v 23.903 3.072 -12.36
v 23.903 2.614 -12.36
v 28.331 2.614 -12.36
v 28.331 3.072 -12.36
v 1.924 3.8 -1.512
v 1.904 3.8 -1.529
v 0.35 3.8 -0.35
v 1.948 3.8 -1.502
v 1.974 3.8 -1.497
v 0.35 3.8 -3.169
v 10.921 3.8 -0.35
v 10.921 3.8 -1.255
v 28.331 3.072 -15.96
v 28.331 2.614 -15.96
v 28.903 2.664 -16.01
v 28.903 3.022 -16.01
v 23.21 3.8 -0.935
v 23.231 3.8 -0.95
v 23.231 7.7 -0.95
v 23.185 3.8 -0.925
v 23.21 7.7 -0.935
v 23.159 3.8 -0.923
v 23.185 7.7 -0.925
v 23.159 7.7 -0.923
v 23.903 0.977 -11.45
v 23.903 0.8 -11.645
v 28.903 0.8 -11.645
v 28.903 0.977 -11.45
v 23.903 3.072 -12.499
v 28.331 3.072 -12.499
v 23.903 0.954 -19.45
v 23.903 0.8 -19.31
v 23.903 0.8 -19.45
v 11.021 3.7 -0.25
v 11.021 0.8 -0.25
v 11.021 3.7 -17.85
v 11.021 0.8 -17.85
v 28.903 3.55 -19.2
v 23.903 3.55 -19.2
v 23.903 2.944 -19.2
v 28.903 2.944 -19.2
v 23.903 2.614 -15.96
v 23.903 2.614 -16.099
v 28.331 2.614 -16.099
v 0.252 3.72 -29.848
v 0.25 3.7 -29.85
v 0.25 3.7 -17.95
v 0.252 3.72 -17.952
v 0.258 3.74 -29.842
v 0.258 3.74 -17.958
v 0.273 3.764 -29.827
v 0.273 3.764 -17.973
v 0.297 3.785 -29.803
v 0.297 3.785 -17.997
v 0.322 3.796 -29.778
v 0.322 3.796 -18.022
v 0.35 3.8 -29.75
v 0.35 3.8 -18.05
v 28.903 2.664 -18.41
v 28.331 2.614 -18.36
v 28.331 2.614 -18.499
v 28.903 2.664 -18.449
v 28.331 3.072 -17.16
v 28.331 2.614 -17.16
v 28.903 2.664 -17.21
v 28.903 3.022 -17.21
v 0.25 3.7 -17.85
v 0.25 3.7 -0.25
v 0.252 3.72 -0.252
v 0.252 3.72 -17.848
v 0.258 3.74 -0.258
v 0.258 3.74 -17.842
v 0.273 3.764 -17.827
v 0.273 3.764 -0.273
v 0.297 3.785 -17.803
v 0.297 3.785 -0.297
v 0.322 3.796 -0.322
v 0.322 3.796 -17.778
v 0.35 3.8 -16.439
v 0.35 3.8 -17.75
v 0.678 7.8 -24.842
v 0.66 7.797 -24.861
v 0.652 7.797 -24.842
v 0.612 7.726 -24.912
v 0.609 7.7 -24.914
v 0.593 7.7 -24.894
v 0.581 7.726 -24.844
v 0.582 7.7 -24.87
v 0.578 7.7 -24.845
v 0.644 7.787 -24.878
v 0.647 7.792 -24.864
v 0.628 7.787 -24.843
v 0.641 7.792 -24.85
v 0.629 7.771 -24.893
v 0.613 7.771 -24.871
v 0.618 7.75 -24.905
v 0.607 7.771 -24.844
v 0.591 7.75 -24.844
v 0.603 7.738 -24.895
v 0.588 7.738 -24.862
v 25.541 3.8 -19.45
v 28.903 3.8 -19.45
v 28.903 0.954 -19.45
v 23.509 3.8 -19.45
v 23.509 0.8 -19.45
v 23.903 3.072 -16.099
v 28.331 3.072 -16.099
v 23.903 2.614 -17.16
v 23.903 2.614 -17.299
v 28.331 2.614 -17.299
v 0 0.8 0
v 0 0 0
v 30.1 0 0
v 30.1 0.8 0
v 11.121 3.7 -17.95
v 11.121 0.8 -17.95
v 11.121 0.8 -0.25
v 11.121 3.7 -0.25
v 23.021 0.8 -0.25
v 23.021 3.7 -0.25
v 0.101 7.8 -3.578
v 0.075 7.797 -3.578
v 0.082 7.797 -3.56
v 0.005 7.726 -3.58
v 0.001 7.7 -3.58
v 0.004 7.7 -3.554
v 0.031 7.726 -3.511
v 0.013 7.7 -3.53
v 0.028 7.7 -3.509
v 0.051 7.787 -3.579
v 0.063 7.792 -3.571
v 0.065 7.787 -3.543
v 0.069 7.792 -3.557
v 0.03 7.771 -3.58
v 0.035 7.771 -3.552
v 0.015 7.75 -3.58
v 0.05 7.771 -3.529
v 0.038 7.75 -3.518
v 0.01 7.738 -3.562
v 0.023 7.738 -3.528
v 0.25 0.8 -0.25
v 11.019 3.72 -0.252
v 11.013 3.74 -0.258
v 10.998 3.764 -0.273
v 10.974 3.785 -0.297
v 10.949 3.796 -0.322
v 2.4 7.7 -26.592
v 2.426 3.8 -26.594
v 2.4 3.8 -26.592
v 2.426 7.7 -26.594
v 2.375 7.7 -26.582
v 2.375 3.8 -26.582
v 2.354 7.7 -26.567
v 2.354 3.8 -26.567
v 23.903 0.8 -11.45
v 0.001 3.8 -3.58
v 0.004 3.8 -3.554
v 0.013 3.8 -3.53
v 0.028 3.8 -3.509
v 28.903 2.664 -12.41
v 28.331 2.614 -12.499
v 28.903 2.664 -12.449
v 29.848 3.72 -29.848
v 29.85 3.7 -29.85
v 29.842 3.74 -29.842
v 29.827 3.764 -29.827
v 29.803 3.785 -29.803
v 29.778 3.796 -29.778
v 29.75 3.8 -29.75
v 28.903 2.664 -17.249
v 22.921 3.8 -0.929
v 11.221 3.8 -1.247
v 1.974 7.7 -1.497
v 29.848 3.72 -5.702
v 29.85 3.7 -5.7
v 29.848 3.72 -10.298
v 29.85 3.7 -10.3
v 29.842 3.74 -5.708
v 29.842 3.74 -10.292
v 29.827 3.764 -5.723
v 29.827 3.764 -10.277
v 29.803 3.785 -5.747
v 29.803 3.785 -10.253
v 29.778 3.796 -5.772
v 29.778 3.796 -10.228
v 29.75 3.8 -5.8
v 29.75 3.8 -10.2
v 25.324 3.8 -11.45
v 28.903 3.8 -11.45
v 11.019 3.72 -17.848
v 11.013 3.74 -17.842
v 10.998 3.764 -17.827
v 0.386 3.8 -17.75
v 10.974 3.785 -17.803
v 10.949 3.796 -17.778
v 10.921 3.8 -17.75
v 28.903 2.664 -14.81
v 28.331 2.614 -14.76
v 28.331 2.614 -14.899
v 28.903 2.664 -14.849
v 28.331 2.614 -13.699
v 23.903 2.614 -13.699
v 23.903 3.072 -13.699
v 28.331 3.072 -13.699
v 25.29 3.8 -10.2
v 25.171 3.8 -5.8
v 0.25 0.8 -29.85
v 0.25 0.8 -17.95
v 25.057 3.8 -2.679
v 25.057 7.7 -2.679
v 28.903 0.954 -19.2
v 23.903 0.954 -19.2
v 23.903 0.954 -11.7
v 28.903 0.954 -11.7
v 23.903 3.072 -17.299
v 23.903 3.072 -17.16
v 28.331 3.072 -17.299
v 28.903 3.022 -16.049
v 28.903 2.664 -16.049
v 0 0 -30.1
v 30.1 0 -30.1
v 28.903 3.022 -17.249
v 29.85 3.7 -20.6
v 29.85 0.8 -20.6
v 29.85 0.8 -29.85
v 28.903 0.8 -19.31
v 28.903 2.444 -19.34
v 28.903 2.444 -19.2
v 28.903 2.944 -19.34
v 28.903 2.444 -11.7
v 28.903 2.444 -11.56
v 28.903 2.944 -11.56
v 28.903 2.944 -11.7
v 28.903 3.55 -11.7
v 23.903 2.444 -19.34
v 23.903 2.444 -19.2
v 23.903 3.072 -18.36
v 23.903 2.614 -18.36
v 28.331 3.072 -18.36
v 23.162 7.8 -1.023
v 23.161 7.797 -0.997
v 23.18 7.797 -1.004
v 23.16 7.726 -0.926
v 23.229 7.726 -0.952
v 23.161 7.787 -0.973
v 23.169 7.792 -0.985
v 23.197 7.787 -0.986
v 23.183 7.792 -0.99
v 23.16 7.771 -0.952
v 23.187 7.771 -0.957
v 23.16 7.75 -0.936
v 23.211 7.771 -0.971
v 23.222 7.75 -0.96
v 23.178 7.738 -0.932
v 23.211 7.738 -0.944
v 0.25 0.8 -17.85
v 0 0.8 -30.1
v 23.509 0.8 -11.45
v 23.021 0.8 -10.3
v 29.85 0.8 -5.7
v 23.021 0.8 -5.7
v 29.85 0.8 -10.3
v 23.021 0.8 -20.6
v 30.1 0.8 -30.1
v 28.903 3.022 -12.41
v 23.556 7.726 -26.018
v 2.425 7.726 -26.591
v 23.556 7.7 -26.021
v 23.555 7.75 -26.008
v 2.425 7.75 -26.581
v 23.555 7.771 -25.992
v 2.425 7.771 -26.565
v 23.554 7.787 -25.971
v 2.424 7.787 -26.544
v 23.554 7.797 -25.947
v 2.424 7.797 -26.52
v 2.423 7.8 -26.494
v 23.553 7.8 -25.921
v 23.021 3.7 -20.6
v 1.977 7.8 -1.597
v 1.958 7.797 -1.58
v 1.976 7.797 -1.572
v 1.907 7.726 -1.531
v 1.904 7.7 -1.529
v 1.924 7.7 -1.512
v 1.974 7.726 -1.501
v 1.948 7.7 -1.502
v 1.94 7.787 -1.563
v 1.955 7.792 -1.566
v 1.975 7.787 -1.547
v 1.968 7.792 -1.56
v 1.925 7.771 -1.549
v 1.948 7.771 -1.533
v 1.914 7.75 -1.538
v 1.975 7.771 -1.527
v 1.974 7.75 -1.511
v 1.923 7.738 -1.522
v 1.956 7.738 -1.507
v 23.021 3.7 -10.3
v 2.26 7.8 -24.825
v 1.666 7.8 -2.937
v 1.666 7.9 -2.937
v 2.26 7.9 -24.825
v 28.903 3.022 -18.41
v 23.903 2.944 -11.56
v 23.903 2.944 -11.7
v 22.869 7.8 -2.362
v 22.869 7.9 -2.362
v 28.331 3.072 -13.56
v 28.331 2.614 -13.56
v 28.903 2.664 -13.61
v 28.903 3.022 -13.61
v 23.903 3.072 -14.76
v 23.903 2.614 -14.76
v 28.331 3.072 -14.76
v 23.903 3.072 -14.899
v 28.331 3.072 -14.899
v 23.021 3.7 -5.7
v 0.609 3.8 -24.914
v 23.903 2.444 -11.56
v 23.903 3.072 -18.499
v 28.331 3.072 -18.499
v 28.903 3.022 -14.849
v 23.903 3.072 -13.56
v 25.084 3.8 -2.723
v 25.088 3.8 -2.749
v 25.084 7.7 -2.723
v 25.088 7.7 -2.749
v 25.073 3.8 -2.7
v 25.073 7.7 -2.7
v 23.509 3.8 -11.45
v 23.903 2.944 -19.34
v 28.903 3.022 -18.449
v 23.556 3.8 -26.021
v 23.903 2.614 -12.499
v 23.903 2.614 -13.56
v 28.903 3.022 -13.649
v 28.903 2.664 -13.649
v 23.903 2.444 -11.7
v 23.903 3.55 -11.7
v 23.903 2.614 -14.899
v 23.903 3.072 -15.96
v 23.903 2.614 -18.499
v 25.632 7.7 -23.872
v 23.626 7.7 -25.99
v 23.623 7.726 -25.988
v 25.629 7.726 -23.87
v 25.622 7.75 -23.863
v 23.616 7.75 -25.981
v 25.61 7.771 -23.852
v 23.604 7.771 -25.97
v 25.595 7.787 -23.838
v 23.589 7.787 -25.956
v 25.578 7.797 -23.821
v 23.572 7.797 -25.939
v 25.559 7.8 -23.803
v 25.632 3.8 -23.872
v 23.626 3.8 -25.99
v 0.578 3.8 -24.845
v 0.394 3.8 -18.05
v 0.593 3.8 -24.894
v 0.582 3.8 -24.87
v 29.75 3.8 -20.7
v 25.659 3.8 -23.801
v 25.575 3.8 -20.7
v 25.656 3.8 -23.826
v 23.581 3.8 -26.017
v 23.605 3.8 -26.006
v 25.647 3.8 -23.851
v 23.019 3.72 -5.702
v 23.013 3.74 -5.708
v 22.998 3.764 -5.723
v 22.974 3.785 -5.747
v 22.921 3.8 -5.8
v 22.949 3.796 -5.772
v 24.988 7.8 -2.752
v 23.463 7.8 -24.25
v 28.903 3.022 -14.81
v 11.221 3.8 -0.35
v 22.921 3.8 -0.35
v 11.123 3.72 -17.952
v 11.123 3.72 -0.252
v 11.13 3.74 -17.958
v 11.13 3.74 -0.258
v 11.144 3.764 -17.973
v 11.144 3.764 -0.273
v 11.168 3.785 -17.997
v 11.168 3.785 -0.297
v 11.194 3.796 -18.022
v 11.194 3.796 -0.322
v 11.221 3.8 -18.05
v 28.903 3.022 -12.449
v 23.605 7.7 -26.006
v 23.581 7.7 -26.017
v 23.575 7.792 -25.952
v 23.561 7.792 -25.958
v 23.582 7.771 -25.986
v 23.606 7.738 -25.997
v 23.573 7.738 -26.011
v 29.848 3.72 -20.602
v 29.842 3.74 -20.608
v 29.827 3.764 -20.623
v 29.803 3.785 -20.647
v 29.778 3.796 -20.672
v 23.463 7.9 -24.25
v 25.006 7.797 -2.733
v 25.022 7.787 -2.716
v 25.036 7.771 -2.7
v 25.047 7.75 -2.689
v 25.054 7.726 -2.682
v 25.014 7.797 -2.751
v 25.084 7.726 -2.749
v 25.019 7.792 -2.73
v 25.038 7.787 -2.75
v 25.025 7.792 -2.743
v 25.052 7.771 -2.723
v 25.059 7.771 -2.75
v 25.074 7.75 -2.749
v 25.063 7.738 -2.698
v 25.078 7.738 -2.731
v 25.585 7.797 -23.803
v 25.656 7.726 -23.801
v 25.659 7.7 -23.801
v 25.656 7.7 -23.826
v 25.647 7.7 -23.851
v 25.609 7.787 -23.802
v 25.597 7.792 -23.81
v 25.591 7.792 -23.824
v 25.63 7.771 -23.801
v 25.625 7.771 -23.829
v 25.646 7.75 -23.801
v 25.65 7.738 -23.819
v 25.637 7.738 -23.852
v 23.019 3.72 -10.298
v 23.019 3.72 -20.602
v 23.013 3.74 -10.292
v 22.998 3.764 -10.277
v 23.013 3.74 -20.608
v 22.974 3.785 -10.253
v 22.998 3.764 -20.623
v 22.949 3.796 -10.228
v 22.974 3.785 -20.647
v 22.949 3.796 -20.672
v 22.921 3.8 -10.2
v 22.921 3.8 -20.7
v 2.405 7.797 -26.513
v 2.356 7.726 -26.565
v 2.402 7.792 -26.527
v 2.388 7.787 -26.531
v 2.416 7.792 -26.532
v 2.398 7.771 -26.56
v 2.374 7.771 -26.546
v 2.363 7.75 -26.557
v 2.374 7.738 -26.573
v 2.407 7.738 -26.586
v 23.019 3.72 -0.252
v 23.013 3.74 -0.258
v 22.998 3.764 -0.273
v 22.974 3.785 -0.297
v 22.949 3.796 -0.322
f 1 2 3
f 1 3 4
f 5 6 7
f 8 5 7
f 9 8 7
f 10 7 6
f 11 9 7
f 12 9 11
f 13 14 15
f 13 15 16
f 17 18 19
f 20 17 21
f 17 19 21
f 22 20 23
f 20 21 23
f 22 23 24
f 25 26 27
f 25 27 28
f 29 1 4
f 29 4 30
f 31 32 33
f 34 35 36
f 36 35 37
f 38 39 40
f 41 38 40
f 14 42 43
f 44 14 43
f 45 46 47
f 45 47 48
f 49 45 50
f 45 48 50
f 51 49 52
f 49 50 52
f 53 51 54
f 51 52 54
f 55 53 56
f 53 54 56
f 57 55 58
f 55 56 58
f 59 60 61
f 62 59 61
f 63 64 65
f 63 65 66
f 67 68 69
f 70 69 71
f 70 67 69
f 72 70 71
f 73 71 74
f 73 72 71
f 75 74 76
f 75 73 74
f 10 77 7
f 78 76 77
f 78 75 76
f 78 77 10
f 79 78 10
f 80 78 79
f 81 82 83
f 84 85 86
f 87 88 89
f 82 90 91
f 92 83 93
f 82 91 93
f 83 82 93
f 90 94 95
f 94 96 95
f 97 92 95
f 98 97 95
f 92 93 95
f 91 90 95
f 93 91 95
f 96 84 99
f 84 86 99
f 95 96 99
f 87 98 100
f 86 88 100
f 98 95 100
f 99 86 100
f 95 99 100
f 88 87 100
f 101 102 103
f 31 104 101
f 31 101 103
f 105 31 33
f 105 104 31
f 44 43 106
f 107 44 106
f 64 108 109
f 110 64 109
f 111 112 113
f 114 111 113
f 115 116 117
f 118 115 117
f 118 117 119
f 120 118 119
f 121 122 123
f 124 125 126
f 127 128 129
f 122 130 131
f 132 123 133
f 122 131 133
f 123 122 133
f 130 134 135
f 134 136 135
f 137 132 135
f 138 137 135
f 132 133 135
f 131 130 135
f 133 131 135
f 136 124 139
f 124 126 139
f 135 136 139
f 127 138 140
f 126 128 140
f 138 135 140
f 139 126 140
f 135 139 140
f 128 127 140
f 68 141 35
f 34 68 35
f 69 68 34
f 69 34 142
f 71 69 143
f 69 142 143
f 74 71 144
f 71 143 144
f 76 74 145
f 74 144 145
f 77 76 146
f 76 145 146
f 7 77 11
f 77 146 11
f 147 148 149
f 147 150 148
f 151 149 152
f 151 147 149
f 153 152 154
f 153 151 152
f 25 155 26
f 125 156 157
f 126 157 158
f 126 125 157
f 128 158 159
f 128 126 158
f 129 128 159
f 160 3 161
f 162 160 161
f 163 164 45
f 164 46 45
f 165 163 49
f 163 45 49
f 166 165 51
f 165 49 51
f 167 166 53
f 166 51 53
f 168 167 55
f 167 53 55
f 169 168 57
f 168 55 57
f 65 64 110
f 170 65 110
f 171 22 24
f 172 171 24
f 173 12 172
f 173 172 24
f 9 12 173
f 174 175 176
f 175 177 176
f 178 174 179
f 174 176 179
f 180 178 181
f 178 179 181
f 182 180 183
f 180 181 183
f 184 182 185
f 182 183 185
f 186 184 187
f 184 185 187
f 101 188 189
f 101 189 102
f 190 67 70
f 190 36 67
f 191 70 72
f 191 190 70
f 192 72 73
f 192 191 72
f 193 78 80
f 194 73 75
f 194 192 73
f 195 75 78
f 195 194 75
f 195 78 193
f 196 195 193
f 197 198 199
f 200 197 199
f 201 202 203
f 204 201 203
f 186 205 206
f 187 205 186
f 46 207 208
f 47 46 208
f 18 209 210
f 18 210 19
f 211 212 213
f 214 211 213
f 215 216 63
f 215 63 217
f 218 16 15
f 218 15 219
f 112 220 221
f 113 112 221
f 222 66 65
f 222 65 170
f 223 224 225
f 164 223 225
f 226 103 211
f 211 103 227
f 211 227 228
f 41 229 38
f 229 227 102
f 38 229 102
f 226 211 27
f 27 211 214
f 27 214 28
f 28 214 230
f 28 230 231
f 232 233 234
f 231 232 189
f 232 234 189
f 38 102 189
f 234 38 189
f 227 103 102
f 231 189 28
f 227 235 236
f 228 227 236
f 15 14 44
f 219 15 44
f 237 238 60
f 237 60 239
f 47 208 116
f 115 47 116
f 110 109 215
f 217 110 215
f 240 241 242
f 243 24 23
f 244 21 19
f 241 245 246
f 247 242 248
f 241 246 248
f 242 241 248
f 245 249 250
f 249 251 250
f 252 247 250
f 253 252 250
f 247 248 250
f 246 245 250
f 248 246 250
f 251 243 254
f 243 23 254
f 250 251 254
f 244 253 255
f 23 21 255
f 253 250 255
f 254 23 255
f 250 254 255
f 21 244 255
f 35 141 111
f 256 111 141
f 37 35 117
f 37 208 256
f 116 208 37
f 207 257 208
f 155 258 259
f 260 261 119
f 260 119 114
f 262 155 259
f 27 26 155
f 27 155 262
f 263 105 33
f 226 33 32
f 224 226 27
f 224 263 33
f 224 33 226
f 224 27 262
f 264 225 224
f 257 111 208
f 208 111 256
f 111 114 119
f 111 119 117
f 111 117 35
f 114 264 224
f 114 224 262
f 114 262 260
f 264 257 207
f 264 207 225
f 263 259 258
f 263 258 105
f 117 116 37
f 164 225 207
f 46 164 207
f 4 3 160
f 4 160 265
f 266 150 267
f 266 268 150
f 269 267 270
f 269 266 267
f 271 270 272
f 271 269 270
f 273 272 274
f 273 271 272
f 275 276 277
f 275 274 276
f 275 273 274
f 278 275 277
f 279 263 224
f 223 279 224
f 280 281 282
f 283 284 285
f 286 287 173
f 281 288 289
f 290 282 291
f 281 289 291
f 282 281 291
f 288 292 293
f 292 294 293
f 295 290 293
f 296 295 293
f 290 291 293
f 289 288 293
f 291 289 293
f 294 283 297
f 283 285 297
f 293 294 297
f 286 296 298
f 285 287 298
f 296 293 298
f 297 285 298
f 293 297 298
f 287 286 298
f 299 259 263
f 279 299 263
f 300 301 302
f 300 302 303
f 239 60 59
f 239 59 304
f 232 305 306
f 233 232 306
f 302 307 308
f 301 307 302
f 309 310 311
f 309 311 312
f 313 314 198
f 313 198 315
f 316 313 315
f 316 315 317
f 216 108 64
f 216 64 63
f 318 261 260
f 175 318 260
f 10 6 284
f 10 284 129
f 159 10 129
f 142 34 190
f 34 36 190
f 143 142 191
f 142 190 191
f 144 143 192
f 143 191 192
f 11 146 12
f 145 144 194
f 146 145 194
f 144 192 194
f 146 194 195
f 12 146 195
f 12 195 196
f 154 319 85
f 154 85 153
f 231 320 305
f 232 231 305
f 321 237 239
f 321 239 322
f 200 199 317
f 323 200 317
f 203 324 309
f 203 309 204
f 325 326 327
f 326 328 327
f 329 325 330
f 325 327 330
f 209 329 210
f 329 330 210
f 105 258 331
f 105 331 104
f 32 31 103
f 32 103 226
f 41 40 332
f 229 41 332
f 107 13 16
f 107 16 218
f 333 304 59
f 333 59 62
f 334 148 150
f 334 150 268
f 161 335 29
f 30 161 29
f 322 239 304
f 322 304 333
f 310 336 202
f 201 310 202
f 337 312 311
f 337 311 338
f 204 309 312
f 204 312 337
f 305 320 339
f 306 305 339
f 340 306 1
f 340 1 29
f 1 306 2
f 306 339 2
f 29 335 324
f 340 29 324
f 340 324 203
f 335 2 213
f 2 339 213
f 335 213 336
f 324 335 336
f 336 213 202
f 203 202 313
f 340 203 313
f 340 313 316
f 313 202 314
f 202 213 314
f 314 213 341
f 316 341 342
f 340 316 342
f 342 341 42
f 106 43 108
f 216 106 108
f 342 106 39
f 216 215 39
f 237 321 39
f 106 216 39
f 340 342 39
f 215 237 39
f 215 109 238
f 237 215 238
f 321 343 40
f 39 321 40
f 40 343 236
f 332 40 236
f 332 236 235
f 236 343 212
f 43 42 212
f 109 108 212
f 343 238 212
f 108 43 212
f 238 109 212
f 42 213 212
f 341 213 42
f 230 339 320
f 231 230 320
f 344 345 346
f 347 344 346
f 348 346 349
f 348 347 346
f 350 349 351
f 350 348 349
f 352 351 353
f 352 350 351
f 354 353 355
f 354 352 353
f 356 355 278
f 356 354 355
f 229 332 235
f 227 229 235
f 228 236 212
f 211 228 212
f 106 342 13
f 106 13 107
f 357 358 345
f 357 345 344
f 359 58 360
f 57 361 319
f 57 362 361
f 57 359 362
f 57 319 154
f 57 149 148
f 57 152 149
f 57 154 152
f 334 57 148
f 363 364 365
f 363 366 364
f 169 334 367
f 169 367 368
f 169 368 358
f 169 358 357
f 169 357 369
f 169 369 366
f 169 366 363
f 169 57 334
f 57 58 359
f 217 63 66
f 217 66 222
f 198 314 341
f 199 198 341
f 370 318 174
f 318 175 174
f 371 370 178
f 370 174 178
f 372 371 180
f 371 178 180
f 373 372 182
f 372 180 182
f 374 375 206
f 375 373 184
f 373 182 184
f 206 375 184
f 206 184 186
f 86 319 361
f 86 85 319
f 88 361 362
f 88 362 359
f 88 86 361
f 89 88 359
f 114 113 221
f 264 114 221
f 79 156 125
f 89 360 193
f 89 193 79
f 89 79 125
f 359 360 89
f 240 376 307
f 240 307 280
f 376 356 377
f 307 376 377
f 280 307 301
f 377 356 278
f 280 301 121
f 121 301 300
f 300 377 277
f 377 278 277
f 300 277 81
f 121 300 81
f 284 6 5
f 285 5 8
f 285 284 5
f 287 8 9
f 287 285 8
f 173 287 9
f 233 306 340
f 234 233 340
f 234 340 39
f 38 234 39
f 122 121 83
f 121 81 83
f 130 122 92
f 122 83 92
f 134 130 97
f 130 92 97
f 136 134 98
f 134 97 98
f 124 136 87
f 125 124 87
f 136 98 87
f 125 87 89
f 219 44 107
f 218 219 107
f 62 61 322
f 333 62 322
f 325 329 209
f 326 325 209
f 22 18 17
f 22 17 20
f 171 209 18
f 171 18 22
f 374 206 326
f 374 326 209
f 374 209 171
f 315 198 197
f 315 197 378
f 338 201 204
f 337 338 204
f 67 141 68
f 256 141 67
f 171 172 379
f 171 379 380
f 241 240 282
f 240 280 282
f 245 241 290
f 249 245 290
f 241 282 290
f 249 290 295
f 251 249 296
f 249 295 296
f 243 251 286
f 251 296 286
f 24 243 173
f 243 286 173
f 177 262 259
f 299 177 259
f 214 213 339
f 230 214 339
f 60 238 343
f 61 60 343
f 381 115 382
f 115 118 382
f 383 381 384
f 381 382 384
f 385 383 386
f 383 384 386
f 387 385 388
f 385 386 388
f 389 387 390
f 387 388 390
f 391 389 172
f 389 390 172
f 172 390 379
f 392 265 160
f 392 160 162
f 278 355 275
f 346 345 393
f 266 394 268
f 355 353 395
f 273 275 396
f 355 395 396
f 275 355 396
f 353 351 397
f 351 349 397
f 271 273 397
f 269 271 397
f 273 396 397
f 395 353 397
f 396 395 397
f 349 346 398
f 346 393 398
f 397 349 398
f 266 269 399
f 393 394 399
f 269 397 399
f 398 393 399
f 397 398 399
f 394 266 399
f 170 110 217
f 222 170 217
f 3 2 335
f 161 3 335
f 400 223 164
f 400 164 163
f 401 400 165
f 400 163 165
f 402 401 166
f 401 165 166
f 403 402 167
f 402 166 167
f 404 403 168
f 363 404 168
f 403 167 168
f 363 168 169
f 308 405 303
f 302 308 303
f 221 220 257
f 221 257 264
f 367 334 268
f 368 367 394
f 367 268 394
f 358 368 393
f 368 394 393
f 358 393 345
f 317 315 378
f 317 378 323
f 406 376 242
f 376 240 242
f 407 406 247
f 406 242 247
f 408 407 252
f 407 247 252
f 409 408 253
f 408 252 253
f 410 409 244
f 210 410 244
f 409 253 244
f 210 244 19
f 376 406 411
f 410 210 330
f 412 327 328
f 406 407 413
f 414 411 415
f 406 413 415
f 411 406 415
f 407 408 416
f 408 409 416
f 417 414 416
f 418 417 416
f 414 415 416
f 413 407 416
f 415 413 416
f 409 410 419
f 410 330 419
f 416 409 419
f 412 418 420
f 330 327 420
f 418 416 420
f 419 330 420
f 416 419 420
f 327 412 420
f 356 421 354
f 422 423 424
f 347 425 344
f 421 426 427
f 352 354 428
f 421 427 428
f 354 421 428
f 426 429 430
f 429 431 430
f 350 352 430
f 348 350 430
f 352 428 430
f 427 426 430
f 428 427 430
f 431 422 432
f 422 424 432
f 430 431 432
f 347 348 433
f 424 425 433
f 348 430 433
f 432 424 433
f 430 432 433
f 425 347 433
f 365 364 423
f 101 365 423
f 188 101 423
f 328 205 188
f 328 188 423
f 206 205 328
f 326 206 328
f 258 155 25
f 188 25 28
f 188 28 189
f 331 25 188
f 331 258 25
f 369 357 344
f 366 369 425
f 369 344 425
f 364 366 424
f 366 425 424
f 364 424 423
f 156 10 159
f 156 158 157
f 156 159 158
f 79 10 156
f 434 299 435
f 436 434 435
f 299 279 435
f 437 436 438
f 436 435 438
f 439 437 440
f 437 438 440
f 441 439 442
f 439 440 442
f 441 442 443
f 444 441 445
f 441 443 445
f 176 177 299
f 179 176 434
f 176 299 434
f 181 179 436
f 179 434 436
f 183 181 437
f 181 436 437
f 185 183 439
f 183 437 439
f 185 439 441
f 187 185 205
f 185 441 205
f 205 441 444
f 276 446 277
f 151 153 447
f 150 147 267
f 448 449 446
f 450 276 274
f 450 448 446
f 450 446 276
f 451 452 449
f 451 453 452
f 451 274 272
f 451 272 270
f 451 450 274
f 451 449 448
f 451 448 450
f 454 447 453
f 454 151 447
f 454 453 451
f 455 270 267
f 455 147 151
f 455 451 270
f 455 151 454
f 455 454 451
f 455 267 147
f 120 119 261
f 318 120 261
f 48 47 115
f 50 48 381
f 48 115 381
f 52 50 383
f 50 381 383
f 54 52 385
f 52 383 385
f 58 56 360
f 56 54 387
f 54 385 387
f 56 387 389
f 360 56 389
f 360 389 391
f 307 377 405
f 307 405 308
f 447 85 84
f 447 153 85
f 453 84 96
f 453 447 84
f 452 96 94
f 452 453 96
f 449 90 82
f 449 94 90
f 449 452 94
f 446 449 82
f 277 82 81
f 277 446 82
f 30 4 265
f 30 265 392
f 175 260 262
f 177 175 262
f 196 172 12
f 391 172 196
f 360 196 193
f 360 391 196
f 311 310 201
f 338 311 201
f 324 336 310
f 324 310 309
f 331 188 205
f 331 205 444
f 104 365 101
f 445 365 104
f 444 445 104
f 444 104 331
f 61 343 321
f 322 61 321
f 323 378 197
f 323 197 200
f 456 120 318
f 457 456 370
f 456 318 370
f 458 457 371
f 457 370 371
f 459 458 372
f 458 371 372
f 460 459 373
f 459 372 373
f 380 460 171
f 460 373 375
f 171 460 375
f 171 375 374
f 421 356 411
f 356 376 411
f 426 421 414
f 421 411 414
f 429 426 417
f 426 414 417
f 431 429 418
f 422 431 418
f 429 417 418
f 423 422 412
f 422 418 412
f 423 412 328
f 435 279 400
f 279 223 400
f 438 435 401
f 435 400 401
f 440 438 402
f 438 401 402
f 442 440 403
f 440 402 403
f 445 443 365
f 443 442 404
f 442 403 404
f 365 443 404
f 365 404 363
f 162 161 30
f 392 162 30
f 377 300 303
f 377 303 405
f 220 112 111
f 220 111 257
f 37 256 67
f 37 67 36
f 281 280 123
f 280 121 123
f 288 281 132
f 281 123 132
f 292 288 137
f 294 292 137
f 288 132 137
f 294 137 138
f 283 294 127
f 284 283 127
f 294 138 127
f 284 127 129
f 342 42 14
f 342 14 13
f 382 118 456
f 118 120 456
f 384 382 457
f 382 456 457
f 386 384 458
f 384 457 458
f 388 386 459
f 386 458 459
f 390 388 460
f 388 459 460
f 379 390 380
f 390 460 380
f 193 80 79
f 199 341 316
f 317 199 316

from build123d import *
from OCP.BRepFilletAPI import BRepFilletAPI_MakeChamfer

# Parameters (mm, degrees)
SKETCH1_W           = 30.1
SKETCH1_H           = 30.1
BOSS_EXTRUDE1_DEPTH = 0.8
SKETCH2_W           = 10.771359077
SKETCH2_H           = 17.6
BOSS_EXTRUDE2_DEPTH = 3
FILLET1_R           = 0.1
SKETCH3_W           = 0.393223552
SKETCH3_H           = 8
BOSS_EXTRUDE3_DEPTH = 3
BOSS_EXTRUDE4_DEPTH = 5
SKETCH5_W           = 0.139227725
SKETCH5_H           = 0.457931022
BOSS_EXTRUDE5_DEPTH = 5
CHAMFER1_SIZE       = 0.05
CHAMFER1_SIZE2      = 0.571502615
BOSS_EXTRUDE6_DEPTH = 4
BOSS_EXTRUDE7_DEPTH = 0.1
FILLET2_R           = 0.1


with BuildPart() as part:
    # Sketch1 → Boss-Extrude1 (new body)
    with BuildSketch(Plane(origin=(0, 0, 0), x_dir=(1, 0, 0), z_dir=(0, 1, 0))):
        with Locations((15.05, 15.05)):
            Rectangle(SKETCH1_W, SKETCH1_H)
    extrude(amount=BOSS_EXTRUDE1_DEPTH)

    # Sketch2 → Boss-Extrude2 (add)
    with BuildSketch(Plane(origin=(0, 0.8, 0), x_dir=(1, 0, 0), z_dir=(0, 1, 0))):
        Polygon((29.85, 29.85), (0.25, 29.85), (0.25, 17.95), (11.121359077, 17.95), (11.121359077, 0.25), (23.021359077, 0.25), (23.021359077, 5.7), (29.85, 5.7), (29.85, 10.3), (23.021359077, 10.3), (23.021359077, 20.6), (29.85, 20.6), align=None)
        with Locations((5.635679539, 9.05)):
            Rectangle(SKETCH2_W, SKETCH2_H)
    extrude(amount=BOSS_EXTRUDE2_DEPTH)

    # Fillet1
    fillet1_edges = [part.edges().sort_by_distance(p)[0] for p in [
        (29.85, 3.8, -25.225),
        (15.05, 3.8, -29.85),
        (0.25, 3.8, -23.9),
        (5.685679539, 3.8, -17.95),
        (11.121359077, 3.8, -9.1),
        (17.071359077, 3.8, -0.25),
        (23.021359077, 3.8, -2.975),
        (26.435679539, 3.8, -5.7),
        (29.85, 3.8, -8),
        (26.435679539, 3.8, -10.3),
        (23.021359077, 3.8, -15.45),
        (26.435679539, 3.8, -20.6),
        (11.021359077, 3.8, -9.05),
        (5.635679539, 3.8, -17.85),
        (0.25, 3.8, -9.05),
        (5.635679539, 3.8, -0.25),
    ]]
    fillet(fillet1_edges, radius=FILLET1_R)

    # Sketch3 → Boss-Extrude3 (add)
    with BuildSketch(Plane(origin=(0, 0.8, 0), x_dir=(1, 0, 0), z_dir=(0, 1, 0))):
        with Locations((23.705954143, 15.45)):
            Rectangle(SKETCH3_W, SKETCH3_H)
    extrude(amount=BOSS_EXTRUDE3_DEPTH)

    # Sketch4 → Boss-Extrude4 (add)
    with BuildSketch(Plane(origin=(23.902565919, 0, 0), x_dir=(0, 0, -1), z_dir=(1, 0, 0))):
        Polygon((11.45, 3.8), (19.45, 3.8), (19.45, 0.954176152), (19.310192822, 0.8), (11.645064396, 0.8), (11.45, 0.976884701), align=None)
        Polygon((11.7, 3.55), (19.2, 3.55), (19.2, 2.943906616), (19.339550272, 2.943906616), (19.339550272, 2.443906616), (19.2, 2.443906616), (19.2, 0.954176152), (11.7, 0.954176152), (11.7, 2.443906616), (11.560449728, 2.443906616), (11.560449728, 2.943906616), (11.7, 2.943906616), align=None, mode=Mode.SUBTRACT)
    extrude(amount=BOSS_EXTRUDE4_DEPTH)

    # Sketch5 → Boss-Extrude5 (add)
    with BuildSketch(Plane(origin=(23.902565919, 0, 0), x_dir=(0, 0, -1), z_dir=(1, 0, 0))):
        with Locations((13.629724037, 2.842775415)):
            Rectangle(SKETCH5_W, SKETCH5_H)
        with Locations((12.429724037, 2.842775415)):
            Rectangle(SKETCH5_W, SKETCH5_H)
        with Locations((14.829724037, 2.842775415)):
            Rectangle(SKETCH5_W, SKETCH5_H)
        with Locations((16.029724036, 2.842775415)):
            Rectangle(SKETCH5_W, SKETCH5_H)
        with Locations((17.229724037, 2.842775415)):
            Rectangle(SKETCH5_W, SKETCH5_H)
        with Locations((18.429724037, 2.842775415)):
            Rectangle(SKETCH5_W, SKETCH5_H)
    extrude(amount=BOSS_EXTRUDE5_DEPTH)

    # Chamfer1: one chamfer whose edges measure the first distance from different faces: ONE call of the kernel's chamfer builder (chamfer() names one face for all edges)
    chamfer1_edges_1 = [part.edges().sort_by_distance(p)[0] for p in [
        (28.902565919, 2.842775415, -12.360110174),
        (28.902565919, 2.613809904, -12.429724036),
        (28.902565919, 2.842775415, -12.499337899),
        (28.902565919, 3.071740926, -12.429724036),
    ]]
    chamfer1_side_1 = [part.faces().sort_by_distance(p)[0] for p in [
        (28.902565919, 2.842775415, -12.429724036),
    ]]
    chamfer1_edges_2 = [part.edges().sort_by_distance(p)[0] for p in [
        (28.902565919, 2.842775415, -13.560110174),
        (28.902565919, 2.613809904, -13.629724036),
        (28.902565919, 2.842775415, -13.699337899),
        (28.902565919, 3.071740926, -13.629724036),
    ]]
    chamfer1_side_2 = [part.faces().sort_by_distance(p)[0] for p in [
        (28.902565919, 2.842775415, -13.629724036),
    ]]
    chamfer1_edges_3 = [part.edges().sort_by_distance(p)[0] for p in [
        (28.902565919, 2.842775415, -14.760110174),
        (28.902565919, 2.613809904, -14.829724036),
        (28.902565919, 2.842775415, -14.899337899),
        (28.902565919, 3.071740926, -14.829724036),
    ]]
    chamfer1_side_3 = [part.faces().sort_by_distance(p)[0] for p in [
        (28.902565919, 2.842775415, -14.829724036),
    ]]
    chamfer1_edges_4 = [part.edges().sort_by_distance(p)[0] for p in [
        (28.902565919, 2.842775415, -15.960110174),
        (28.902565919, 2.613809904, -16.029724036),
        (28.902565919, 2.842775415, -16.099337899),
        (28.902565919, 3.071740926, -16.029724036),
    ]]
    chamfer1_side_4 = [part.faces().sort_by_distance(p)[0] for p in [
        (28.902565919, 2.842775415, -16.029724036),
    ]]
    chamfer1_edges_5 = [part.edges().sort_by_distance(p)[0] for p in [
        (28.902565919, 2.842775415, -17.160110174),
        (28.902565919, 2.613809904, -17.229724036),
        (28.902565919, 2.842775415, -17.299337899),
        (28.902565919, 3.071740926, -17.229724036),
    ]]
    chamfer1_side_5 = [part.faces().sort_by_distance(p)[0] for p in [
        (28.902565919, 2.842775415, -17.229724036),
    ]]
    chamfer1_edges_6 = [part.edges().sort_by_distance(p)[0] for p in [
        (28.902565919, 2.842775415, -18.360110174),
        (28.902565919, 2.613809904, -18.429724036),
        (28.902565919, 2.842775415, -18.499337899),
        (28.902565919, 3.071740926, -18.429724036),
    ]]
    chamfer1_side_6 = [part.faces().sort_by_distance(p)[0] for p in [
        (28.902565919, 2.842775415, -18.429724036),
    ]]
    chamfer1 = BRepFilletAPI_MakeChamfer(part.part.solid().wrapped)
    for e in chamfer1_edges_1:
        chamfer1.Add(CHAMFER1_SIZE, CHAMFER1_SIZE2, e.wrapped, chamfer1_side_1[0].wrapped)  # the first distance lies on this face
    for e in chamfer1_edges_2:
        chamfer1.Add(CHAMFER1_SIZE, CHAMFER1_SIZE2, e.wrapped, chamfer1_side_2[0].wrapped)  # the first distance lies on this face
    for e in chamfer1_edges_3:
        chamfer1.Add(CHAMFER1_SIZE, CHAMFER1_SIZE2, e.wrapped, chamfer1_side_3[0].wrapped)  # the first distance lies on this face
    for e in chamfer1_edges_4:
        chamfer1.Add(CHAMFER1_SIZE, CHAMFER1_SIZE2, e.wrapped, chamfer1_side_4[0].wrapped)  # the first distance lies on this face
    for e in chamfer1_edges_5:
        chamfer1.Add(CHAMFER1_SIZE, CHAMFER1_SIZE2, e.wrapped, chamfer1_side_5[0].wrapped)  # the first distance lies on this face
    for e in chamfer1_edges_6:
        chamfer1.Add(CHAMFER1_SIZE, CHAMFER1_SIZE2, e.wrapped, chamfer1_side_6[0].wrapped)  # the first distance lies on this face
    add(Compound.cast(chamfer1.Shape()), mode=Mode.REPLACE)

    # Sketch6 → Boss-Extrude6 (add)
    with BuildSketch(Plane(origin=(0, 3.8, 0), x_dir=(1, 0, 0), z_dir=(0, 1, 0))):
        Polygon((2.384156778, 26.595544695), (23.597073632, 26.020012034), (25.660080778, 23.841939144), (25.08668319, 2.707716574), (23.200865717, 0.921525239), (1.93262783, 1.498558828), (0, 3.5389804), (0.579168662, 24.885912571), align=None)
    extrude(amount=BOSS_EXTRUDE6_DEPTH)

    # Sketch7 → Boss-Extrude7 (add)
    with BuildSketch(Plane(origin=(0, 7.8, 0), x_dir=(1, 0, 0), z_dir=(0, 1, 0))):
        Polygon((2.259866972, 24.824959048), (23.462598641, 24.249702724), (22.868758373, 2.362006201), (1.666026705, 2.937262525), align=None)
    extrude(amount=BOSS_EXTRUDE7_DEPTH)

    # Fillet2
    fillet2_edges = [part.edges().sort_by_distance(p)[0] for p in [
        (2.384156778, 5.8, -26.595544695),
        (0.579168662, 5.8, -24.885912571),
        (0, 5.8, -3.5389804),
        (1.93262783, 5.8, -1.498558828),
        (23.200865717, 5.8, -0.921525239),
        (25.08668319, 5.8, -2.707716574),
        (25.660080778, 5.8, -23.841939144),
        (23.597073632, 5.8, -26.020012034),
        (1.48166272, 7.8, -25.740728633),
        (0.289584331, 7.8, -14.212446486),
        (0.966313915, 7.8, -2.518769614),
        (12.566746773, 7.8, -1.210042034),
        (24.143774453, 7.8, -1.814620907),
        (25.373381984, 7.8, -13.274827859),
        (24.628577205, 7.8, -24.930975589),
        (12.990615205, 7.8, -26.307778365),
    ]]
    fillet(fillet2_edges, radius=FILLET2_R)


solid = part.part
